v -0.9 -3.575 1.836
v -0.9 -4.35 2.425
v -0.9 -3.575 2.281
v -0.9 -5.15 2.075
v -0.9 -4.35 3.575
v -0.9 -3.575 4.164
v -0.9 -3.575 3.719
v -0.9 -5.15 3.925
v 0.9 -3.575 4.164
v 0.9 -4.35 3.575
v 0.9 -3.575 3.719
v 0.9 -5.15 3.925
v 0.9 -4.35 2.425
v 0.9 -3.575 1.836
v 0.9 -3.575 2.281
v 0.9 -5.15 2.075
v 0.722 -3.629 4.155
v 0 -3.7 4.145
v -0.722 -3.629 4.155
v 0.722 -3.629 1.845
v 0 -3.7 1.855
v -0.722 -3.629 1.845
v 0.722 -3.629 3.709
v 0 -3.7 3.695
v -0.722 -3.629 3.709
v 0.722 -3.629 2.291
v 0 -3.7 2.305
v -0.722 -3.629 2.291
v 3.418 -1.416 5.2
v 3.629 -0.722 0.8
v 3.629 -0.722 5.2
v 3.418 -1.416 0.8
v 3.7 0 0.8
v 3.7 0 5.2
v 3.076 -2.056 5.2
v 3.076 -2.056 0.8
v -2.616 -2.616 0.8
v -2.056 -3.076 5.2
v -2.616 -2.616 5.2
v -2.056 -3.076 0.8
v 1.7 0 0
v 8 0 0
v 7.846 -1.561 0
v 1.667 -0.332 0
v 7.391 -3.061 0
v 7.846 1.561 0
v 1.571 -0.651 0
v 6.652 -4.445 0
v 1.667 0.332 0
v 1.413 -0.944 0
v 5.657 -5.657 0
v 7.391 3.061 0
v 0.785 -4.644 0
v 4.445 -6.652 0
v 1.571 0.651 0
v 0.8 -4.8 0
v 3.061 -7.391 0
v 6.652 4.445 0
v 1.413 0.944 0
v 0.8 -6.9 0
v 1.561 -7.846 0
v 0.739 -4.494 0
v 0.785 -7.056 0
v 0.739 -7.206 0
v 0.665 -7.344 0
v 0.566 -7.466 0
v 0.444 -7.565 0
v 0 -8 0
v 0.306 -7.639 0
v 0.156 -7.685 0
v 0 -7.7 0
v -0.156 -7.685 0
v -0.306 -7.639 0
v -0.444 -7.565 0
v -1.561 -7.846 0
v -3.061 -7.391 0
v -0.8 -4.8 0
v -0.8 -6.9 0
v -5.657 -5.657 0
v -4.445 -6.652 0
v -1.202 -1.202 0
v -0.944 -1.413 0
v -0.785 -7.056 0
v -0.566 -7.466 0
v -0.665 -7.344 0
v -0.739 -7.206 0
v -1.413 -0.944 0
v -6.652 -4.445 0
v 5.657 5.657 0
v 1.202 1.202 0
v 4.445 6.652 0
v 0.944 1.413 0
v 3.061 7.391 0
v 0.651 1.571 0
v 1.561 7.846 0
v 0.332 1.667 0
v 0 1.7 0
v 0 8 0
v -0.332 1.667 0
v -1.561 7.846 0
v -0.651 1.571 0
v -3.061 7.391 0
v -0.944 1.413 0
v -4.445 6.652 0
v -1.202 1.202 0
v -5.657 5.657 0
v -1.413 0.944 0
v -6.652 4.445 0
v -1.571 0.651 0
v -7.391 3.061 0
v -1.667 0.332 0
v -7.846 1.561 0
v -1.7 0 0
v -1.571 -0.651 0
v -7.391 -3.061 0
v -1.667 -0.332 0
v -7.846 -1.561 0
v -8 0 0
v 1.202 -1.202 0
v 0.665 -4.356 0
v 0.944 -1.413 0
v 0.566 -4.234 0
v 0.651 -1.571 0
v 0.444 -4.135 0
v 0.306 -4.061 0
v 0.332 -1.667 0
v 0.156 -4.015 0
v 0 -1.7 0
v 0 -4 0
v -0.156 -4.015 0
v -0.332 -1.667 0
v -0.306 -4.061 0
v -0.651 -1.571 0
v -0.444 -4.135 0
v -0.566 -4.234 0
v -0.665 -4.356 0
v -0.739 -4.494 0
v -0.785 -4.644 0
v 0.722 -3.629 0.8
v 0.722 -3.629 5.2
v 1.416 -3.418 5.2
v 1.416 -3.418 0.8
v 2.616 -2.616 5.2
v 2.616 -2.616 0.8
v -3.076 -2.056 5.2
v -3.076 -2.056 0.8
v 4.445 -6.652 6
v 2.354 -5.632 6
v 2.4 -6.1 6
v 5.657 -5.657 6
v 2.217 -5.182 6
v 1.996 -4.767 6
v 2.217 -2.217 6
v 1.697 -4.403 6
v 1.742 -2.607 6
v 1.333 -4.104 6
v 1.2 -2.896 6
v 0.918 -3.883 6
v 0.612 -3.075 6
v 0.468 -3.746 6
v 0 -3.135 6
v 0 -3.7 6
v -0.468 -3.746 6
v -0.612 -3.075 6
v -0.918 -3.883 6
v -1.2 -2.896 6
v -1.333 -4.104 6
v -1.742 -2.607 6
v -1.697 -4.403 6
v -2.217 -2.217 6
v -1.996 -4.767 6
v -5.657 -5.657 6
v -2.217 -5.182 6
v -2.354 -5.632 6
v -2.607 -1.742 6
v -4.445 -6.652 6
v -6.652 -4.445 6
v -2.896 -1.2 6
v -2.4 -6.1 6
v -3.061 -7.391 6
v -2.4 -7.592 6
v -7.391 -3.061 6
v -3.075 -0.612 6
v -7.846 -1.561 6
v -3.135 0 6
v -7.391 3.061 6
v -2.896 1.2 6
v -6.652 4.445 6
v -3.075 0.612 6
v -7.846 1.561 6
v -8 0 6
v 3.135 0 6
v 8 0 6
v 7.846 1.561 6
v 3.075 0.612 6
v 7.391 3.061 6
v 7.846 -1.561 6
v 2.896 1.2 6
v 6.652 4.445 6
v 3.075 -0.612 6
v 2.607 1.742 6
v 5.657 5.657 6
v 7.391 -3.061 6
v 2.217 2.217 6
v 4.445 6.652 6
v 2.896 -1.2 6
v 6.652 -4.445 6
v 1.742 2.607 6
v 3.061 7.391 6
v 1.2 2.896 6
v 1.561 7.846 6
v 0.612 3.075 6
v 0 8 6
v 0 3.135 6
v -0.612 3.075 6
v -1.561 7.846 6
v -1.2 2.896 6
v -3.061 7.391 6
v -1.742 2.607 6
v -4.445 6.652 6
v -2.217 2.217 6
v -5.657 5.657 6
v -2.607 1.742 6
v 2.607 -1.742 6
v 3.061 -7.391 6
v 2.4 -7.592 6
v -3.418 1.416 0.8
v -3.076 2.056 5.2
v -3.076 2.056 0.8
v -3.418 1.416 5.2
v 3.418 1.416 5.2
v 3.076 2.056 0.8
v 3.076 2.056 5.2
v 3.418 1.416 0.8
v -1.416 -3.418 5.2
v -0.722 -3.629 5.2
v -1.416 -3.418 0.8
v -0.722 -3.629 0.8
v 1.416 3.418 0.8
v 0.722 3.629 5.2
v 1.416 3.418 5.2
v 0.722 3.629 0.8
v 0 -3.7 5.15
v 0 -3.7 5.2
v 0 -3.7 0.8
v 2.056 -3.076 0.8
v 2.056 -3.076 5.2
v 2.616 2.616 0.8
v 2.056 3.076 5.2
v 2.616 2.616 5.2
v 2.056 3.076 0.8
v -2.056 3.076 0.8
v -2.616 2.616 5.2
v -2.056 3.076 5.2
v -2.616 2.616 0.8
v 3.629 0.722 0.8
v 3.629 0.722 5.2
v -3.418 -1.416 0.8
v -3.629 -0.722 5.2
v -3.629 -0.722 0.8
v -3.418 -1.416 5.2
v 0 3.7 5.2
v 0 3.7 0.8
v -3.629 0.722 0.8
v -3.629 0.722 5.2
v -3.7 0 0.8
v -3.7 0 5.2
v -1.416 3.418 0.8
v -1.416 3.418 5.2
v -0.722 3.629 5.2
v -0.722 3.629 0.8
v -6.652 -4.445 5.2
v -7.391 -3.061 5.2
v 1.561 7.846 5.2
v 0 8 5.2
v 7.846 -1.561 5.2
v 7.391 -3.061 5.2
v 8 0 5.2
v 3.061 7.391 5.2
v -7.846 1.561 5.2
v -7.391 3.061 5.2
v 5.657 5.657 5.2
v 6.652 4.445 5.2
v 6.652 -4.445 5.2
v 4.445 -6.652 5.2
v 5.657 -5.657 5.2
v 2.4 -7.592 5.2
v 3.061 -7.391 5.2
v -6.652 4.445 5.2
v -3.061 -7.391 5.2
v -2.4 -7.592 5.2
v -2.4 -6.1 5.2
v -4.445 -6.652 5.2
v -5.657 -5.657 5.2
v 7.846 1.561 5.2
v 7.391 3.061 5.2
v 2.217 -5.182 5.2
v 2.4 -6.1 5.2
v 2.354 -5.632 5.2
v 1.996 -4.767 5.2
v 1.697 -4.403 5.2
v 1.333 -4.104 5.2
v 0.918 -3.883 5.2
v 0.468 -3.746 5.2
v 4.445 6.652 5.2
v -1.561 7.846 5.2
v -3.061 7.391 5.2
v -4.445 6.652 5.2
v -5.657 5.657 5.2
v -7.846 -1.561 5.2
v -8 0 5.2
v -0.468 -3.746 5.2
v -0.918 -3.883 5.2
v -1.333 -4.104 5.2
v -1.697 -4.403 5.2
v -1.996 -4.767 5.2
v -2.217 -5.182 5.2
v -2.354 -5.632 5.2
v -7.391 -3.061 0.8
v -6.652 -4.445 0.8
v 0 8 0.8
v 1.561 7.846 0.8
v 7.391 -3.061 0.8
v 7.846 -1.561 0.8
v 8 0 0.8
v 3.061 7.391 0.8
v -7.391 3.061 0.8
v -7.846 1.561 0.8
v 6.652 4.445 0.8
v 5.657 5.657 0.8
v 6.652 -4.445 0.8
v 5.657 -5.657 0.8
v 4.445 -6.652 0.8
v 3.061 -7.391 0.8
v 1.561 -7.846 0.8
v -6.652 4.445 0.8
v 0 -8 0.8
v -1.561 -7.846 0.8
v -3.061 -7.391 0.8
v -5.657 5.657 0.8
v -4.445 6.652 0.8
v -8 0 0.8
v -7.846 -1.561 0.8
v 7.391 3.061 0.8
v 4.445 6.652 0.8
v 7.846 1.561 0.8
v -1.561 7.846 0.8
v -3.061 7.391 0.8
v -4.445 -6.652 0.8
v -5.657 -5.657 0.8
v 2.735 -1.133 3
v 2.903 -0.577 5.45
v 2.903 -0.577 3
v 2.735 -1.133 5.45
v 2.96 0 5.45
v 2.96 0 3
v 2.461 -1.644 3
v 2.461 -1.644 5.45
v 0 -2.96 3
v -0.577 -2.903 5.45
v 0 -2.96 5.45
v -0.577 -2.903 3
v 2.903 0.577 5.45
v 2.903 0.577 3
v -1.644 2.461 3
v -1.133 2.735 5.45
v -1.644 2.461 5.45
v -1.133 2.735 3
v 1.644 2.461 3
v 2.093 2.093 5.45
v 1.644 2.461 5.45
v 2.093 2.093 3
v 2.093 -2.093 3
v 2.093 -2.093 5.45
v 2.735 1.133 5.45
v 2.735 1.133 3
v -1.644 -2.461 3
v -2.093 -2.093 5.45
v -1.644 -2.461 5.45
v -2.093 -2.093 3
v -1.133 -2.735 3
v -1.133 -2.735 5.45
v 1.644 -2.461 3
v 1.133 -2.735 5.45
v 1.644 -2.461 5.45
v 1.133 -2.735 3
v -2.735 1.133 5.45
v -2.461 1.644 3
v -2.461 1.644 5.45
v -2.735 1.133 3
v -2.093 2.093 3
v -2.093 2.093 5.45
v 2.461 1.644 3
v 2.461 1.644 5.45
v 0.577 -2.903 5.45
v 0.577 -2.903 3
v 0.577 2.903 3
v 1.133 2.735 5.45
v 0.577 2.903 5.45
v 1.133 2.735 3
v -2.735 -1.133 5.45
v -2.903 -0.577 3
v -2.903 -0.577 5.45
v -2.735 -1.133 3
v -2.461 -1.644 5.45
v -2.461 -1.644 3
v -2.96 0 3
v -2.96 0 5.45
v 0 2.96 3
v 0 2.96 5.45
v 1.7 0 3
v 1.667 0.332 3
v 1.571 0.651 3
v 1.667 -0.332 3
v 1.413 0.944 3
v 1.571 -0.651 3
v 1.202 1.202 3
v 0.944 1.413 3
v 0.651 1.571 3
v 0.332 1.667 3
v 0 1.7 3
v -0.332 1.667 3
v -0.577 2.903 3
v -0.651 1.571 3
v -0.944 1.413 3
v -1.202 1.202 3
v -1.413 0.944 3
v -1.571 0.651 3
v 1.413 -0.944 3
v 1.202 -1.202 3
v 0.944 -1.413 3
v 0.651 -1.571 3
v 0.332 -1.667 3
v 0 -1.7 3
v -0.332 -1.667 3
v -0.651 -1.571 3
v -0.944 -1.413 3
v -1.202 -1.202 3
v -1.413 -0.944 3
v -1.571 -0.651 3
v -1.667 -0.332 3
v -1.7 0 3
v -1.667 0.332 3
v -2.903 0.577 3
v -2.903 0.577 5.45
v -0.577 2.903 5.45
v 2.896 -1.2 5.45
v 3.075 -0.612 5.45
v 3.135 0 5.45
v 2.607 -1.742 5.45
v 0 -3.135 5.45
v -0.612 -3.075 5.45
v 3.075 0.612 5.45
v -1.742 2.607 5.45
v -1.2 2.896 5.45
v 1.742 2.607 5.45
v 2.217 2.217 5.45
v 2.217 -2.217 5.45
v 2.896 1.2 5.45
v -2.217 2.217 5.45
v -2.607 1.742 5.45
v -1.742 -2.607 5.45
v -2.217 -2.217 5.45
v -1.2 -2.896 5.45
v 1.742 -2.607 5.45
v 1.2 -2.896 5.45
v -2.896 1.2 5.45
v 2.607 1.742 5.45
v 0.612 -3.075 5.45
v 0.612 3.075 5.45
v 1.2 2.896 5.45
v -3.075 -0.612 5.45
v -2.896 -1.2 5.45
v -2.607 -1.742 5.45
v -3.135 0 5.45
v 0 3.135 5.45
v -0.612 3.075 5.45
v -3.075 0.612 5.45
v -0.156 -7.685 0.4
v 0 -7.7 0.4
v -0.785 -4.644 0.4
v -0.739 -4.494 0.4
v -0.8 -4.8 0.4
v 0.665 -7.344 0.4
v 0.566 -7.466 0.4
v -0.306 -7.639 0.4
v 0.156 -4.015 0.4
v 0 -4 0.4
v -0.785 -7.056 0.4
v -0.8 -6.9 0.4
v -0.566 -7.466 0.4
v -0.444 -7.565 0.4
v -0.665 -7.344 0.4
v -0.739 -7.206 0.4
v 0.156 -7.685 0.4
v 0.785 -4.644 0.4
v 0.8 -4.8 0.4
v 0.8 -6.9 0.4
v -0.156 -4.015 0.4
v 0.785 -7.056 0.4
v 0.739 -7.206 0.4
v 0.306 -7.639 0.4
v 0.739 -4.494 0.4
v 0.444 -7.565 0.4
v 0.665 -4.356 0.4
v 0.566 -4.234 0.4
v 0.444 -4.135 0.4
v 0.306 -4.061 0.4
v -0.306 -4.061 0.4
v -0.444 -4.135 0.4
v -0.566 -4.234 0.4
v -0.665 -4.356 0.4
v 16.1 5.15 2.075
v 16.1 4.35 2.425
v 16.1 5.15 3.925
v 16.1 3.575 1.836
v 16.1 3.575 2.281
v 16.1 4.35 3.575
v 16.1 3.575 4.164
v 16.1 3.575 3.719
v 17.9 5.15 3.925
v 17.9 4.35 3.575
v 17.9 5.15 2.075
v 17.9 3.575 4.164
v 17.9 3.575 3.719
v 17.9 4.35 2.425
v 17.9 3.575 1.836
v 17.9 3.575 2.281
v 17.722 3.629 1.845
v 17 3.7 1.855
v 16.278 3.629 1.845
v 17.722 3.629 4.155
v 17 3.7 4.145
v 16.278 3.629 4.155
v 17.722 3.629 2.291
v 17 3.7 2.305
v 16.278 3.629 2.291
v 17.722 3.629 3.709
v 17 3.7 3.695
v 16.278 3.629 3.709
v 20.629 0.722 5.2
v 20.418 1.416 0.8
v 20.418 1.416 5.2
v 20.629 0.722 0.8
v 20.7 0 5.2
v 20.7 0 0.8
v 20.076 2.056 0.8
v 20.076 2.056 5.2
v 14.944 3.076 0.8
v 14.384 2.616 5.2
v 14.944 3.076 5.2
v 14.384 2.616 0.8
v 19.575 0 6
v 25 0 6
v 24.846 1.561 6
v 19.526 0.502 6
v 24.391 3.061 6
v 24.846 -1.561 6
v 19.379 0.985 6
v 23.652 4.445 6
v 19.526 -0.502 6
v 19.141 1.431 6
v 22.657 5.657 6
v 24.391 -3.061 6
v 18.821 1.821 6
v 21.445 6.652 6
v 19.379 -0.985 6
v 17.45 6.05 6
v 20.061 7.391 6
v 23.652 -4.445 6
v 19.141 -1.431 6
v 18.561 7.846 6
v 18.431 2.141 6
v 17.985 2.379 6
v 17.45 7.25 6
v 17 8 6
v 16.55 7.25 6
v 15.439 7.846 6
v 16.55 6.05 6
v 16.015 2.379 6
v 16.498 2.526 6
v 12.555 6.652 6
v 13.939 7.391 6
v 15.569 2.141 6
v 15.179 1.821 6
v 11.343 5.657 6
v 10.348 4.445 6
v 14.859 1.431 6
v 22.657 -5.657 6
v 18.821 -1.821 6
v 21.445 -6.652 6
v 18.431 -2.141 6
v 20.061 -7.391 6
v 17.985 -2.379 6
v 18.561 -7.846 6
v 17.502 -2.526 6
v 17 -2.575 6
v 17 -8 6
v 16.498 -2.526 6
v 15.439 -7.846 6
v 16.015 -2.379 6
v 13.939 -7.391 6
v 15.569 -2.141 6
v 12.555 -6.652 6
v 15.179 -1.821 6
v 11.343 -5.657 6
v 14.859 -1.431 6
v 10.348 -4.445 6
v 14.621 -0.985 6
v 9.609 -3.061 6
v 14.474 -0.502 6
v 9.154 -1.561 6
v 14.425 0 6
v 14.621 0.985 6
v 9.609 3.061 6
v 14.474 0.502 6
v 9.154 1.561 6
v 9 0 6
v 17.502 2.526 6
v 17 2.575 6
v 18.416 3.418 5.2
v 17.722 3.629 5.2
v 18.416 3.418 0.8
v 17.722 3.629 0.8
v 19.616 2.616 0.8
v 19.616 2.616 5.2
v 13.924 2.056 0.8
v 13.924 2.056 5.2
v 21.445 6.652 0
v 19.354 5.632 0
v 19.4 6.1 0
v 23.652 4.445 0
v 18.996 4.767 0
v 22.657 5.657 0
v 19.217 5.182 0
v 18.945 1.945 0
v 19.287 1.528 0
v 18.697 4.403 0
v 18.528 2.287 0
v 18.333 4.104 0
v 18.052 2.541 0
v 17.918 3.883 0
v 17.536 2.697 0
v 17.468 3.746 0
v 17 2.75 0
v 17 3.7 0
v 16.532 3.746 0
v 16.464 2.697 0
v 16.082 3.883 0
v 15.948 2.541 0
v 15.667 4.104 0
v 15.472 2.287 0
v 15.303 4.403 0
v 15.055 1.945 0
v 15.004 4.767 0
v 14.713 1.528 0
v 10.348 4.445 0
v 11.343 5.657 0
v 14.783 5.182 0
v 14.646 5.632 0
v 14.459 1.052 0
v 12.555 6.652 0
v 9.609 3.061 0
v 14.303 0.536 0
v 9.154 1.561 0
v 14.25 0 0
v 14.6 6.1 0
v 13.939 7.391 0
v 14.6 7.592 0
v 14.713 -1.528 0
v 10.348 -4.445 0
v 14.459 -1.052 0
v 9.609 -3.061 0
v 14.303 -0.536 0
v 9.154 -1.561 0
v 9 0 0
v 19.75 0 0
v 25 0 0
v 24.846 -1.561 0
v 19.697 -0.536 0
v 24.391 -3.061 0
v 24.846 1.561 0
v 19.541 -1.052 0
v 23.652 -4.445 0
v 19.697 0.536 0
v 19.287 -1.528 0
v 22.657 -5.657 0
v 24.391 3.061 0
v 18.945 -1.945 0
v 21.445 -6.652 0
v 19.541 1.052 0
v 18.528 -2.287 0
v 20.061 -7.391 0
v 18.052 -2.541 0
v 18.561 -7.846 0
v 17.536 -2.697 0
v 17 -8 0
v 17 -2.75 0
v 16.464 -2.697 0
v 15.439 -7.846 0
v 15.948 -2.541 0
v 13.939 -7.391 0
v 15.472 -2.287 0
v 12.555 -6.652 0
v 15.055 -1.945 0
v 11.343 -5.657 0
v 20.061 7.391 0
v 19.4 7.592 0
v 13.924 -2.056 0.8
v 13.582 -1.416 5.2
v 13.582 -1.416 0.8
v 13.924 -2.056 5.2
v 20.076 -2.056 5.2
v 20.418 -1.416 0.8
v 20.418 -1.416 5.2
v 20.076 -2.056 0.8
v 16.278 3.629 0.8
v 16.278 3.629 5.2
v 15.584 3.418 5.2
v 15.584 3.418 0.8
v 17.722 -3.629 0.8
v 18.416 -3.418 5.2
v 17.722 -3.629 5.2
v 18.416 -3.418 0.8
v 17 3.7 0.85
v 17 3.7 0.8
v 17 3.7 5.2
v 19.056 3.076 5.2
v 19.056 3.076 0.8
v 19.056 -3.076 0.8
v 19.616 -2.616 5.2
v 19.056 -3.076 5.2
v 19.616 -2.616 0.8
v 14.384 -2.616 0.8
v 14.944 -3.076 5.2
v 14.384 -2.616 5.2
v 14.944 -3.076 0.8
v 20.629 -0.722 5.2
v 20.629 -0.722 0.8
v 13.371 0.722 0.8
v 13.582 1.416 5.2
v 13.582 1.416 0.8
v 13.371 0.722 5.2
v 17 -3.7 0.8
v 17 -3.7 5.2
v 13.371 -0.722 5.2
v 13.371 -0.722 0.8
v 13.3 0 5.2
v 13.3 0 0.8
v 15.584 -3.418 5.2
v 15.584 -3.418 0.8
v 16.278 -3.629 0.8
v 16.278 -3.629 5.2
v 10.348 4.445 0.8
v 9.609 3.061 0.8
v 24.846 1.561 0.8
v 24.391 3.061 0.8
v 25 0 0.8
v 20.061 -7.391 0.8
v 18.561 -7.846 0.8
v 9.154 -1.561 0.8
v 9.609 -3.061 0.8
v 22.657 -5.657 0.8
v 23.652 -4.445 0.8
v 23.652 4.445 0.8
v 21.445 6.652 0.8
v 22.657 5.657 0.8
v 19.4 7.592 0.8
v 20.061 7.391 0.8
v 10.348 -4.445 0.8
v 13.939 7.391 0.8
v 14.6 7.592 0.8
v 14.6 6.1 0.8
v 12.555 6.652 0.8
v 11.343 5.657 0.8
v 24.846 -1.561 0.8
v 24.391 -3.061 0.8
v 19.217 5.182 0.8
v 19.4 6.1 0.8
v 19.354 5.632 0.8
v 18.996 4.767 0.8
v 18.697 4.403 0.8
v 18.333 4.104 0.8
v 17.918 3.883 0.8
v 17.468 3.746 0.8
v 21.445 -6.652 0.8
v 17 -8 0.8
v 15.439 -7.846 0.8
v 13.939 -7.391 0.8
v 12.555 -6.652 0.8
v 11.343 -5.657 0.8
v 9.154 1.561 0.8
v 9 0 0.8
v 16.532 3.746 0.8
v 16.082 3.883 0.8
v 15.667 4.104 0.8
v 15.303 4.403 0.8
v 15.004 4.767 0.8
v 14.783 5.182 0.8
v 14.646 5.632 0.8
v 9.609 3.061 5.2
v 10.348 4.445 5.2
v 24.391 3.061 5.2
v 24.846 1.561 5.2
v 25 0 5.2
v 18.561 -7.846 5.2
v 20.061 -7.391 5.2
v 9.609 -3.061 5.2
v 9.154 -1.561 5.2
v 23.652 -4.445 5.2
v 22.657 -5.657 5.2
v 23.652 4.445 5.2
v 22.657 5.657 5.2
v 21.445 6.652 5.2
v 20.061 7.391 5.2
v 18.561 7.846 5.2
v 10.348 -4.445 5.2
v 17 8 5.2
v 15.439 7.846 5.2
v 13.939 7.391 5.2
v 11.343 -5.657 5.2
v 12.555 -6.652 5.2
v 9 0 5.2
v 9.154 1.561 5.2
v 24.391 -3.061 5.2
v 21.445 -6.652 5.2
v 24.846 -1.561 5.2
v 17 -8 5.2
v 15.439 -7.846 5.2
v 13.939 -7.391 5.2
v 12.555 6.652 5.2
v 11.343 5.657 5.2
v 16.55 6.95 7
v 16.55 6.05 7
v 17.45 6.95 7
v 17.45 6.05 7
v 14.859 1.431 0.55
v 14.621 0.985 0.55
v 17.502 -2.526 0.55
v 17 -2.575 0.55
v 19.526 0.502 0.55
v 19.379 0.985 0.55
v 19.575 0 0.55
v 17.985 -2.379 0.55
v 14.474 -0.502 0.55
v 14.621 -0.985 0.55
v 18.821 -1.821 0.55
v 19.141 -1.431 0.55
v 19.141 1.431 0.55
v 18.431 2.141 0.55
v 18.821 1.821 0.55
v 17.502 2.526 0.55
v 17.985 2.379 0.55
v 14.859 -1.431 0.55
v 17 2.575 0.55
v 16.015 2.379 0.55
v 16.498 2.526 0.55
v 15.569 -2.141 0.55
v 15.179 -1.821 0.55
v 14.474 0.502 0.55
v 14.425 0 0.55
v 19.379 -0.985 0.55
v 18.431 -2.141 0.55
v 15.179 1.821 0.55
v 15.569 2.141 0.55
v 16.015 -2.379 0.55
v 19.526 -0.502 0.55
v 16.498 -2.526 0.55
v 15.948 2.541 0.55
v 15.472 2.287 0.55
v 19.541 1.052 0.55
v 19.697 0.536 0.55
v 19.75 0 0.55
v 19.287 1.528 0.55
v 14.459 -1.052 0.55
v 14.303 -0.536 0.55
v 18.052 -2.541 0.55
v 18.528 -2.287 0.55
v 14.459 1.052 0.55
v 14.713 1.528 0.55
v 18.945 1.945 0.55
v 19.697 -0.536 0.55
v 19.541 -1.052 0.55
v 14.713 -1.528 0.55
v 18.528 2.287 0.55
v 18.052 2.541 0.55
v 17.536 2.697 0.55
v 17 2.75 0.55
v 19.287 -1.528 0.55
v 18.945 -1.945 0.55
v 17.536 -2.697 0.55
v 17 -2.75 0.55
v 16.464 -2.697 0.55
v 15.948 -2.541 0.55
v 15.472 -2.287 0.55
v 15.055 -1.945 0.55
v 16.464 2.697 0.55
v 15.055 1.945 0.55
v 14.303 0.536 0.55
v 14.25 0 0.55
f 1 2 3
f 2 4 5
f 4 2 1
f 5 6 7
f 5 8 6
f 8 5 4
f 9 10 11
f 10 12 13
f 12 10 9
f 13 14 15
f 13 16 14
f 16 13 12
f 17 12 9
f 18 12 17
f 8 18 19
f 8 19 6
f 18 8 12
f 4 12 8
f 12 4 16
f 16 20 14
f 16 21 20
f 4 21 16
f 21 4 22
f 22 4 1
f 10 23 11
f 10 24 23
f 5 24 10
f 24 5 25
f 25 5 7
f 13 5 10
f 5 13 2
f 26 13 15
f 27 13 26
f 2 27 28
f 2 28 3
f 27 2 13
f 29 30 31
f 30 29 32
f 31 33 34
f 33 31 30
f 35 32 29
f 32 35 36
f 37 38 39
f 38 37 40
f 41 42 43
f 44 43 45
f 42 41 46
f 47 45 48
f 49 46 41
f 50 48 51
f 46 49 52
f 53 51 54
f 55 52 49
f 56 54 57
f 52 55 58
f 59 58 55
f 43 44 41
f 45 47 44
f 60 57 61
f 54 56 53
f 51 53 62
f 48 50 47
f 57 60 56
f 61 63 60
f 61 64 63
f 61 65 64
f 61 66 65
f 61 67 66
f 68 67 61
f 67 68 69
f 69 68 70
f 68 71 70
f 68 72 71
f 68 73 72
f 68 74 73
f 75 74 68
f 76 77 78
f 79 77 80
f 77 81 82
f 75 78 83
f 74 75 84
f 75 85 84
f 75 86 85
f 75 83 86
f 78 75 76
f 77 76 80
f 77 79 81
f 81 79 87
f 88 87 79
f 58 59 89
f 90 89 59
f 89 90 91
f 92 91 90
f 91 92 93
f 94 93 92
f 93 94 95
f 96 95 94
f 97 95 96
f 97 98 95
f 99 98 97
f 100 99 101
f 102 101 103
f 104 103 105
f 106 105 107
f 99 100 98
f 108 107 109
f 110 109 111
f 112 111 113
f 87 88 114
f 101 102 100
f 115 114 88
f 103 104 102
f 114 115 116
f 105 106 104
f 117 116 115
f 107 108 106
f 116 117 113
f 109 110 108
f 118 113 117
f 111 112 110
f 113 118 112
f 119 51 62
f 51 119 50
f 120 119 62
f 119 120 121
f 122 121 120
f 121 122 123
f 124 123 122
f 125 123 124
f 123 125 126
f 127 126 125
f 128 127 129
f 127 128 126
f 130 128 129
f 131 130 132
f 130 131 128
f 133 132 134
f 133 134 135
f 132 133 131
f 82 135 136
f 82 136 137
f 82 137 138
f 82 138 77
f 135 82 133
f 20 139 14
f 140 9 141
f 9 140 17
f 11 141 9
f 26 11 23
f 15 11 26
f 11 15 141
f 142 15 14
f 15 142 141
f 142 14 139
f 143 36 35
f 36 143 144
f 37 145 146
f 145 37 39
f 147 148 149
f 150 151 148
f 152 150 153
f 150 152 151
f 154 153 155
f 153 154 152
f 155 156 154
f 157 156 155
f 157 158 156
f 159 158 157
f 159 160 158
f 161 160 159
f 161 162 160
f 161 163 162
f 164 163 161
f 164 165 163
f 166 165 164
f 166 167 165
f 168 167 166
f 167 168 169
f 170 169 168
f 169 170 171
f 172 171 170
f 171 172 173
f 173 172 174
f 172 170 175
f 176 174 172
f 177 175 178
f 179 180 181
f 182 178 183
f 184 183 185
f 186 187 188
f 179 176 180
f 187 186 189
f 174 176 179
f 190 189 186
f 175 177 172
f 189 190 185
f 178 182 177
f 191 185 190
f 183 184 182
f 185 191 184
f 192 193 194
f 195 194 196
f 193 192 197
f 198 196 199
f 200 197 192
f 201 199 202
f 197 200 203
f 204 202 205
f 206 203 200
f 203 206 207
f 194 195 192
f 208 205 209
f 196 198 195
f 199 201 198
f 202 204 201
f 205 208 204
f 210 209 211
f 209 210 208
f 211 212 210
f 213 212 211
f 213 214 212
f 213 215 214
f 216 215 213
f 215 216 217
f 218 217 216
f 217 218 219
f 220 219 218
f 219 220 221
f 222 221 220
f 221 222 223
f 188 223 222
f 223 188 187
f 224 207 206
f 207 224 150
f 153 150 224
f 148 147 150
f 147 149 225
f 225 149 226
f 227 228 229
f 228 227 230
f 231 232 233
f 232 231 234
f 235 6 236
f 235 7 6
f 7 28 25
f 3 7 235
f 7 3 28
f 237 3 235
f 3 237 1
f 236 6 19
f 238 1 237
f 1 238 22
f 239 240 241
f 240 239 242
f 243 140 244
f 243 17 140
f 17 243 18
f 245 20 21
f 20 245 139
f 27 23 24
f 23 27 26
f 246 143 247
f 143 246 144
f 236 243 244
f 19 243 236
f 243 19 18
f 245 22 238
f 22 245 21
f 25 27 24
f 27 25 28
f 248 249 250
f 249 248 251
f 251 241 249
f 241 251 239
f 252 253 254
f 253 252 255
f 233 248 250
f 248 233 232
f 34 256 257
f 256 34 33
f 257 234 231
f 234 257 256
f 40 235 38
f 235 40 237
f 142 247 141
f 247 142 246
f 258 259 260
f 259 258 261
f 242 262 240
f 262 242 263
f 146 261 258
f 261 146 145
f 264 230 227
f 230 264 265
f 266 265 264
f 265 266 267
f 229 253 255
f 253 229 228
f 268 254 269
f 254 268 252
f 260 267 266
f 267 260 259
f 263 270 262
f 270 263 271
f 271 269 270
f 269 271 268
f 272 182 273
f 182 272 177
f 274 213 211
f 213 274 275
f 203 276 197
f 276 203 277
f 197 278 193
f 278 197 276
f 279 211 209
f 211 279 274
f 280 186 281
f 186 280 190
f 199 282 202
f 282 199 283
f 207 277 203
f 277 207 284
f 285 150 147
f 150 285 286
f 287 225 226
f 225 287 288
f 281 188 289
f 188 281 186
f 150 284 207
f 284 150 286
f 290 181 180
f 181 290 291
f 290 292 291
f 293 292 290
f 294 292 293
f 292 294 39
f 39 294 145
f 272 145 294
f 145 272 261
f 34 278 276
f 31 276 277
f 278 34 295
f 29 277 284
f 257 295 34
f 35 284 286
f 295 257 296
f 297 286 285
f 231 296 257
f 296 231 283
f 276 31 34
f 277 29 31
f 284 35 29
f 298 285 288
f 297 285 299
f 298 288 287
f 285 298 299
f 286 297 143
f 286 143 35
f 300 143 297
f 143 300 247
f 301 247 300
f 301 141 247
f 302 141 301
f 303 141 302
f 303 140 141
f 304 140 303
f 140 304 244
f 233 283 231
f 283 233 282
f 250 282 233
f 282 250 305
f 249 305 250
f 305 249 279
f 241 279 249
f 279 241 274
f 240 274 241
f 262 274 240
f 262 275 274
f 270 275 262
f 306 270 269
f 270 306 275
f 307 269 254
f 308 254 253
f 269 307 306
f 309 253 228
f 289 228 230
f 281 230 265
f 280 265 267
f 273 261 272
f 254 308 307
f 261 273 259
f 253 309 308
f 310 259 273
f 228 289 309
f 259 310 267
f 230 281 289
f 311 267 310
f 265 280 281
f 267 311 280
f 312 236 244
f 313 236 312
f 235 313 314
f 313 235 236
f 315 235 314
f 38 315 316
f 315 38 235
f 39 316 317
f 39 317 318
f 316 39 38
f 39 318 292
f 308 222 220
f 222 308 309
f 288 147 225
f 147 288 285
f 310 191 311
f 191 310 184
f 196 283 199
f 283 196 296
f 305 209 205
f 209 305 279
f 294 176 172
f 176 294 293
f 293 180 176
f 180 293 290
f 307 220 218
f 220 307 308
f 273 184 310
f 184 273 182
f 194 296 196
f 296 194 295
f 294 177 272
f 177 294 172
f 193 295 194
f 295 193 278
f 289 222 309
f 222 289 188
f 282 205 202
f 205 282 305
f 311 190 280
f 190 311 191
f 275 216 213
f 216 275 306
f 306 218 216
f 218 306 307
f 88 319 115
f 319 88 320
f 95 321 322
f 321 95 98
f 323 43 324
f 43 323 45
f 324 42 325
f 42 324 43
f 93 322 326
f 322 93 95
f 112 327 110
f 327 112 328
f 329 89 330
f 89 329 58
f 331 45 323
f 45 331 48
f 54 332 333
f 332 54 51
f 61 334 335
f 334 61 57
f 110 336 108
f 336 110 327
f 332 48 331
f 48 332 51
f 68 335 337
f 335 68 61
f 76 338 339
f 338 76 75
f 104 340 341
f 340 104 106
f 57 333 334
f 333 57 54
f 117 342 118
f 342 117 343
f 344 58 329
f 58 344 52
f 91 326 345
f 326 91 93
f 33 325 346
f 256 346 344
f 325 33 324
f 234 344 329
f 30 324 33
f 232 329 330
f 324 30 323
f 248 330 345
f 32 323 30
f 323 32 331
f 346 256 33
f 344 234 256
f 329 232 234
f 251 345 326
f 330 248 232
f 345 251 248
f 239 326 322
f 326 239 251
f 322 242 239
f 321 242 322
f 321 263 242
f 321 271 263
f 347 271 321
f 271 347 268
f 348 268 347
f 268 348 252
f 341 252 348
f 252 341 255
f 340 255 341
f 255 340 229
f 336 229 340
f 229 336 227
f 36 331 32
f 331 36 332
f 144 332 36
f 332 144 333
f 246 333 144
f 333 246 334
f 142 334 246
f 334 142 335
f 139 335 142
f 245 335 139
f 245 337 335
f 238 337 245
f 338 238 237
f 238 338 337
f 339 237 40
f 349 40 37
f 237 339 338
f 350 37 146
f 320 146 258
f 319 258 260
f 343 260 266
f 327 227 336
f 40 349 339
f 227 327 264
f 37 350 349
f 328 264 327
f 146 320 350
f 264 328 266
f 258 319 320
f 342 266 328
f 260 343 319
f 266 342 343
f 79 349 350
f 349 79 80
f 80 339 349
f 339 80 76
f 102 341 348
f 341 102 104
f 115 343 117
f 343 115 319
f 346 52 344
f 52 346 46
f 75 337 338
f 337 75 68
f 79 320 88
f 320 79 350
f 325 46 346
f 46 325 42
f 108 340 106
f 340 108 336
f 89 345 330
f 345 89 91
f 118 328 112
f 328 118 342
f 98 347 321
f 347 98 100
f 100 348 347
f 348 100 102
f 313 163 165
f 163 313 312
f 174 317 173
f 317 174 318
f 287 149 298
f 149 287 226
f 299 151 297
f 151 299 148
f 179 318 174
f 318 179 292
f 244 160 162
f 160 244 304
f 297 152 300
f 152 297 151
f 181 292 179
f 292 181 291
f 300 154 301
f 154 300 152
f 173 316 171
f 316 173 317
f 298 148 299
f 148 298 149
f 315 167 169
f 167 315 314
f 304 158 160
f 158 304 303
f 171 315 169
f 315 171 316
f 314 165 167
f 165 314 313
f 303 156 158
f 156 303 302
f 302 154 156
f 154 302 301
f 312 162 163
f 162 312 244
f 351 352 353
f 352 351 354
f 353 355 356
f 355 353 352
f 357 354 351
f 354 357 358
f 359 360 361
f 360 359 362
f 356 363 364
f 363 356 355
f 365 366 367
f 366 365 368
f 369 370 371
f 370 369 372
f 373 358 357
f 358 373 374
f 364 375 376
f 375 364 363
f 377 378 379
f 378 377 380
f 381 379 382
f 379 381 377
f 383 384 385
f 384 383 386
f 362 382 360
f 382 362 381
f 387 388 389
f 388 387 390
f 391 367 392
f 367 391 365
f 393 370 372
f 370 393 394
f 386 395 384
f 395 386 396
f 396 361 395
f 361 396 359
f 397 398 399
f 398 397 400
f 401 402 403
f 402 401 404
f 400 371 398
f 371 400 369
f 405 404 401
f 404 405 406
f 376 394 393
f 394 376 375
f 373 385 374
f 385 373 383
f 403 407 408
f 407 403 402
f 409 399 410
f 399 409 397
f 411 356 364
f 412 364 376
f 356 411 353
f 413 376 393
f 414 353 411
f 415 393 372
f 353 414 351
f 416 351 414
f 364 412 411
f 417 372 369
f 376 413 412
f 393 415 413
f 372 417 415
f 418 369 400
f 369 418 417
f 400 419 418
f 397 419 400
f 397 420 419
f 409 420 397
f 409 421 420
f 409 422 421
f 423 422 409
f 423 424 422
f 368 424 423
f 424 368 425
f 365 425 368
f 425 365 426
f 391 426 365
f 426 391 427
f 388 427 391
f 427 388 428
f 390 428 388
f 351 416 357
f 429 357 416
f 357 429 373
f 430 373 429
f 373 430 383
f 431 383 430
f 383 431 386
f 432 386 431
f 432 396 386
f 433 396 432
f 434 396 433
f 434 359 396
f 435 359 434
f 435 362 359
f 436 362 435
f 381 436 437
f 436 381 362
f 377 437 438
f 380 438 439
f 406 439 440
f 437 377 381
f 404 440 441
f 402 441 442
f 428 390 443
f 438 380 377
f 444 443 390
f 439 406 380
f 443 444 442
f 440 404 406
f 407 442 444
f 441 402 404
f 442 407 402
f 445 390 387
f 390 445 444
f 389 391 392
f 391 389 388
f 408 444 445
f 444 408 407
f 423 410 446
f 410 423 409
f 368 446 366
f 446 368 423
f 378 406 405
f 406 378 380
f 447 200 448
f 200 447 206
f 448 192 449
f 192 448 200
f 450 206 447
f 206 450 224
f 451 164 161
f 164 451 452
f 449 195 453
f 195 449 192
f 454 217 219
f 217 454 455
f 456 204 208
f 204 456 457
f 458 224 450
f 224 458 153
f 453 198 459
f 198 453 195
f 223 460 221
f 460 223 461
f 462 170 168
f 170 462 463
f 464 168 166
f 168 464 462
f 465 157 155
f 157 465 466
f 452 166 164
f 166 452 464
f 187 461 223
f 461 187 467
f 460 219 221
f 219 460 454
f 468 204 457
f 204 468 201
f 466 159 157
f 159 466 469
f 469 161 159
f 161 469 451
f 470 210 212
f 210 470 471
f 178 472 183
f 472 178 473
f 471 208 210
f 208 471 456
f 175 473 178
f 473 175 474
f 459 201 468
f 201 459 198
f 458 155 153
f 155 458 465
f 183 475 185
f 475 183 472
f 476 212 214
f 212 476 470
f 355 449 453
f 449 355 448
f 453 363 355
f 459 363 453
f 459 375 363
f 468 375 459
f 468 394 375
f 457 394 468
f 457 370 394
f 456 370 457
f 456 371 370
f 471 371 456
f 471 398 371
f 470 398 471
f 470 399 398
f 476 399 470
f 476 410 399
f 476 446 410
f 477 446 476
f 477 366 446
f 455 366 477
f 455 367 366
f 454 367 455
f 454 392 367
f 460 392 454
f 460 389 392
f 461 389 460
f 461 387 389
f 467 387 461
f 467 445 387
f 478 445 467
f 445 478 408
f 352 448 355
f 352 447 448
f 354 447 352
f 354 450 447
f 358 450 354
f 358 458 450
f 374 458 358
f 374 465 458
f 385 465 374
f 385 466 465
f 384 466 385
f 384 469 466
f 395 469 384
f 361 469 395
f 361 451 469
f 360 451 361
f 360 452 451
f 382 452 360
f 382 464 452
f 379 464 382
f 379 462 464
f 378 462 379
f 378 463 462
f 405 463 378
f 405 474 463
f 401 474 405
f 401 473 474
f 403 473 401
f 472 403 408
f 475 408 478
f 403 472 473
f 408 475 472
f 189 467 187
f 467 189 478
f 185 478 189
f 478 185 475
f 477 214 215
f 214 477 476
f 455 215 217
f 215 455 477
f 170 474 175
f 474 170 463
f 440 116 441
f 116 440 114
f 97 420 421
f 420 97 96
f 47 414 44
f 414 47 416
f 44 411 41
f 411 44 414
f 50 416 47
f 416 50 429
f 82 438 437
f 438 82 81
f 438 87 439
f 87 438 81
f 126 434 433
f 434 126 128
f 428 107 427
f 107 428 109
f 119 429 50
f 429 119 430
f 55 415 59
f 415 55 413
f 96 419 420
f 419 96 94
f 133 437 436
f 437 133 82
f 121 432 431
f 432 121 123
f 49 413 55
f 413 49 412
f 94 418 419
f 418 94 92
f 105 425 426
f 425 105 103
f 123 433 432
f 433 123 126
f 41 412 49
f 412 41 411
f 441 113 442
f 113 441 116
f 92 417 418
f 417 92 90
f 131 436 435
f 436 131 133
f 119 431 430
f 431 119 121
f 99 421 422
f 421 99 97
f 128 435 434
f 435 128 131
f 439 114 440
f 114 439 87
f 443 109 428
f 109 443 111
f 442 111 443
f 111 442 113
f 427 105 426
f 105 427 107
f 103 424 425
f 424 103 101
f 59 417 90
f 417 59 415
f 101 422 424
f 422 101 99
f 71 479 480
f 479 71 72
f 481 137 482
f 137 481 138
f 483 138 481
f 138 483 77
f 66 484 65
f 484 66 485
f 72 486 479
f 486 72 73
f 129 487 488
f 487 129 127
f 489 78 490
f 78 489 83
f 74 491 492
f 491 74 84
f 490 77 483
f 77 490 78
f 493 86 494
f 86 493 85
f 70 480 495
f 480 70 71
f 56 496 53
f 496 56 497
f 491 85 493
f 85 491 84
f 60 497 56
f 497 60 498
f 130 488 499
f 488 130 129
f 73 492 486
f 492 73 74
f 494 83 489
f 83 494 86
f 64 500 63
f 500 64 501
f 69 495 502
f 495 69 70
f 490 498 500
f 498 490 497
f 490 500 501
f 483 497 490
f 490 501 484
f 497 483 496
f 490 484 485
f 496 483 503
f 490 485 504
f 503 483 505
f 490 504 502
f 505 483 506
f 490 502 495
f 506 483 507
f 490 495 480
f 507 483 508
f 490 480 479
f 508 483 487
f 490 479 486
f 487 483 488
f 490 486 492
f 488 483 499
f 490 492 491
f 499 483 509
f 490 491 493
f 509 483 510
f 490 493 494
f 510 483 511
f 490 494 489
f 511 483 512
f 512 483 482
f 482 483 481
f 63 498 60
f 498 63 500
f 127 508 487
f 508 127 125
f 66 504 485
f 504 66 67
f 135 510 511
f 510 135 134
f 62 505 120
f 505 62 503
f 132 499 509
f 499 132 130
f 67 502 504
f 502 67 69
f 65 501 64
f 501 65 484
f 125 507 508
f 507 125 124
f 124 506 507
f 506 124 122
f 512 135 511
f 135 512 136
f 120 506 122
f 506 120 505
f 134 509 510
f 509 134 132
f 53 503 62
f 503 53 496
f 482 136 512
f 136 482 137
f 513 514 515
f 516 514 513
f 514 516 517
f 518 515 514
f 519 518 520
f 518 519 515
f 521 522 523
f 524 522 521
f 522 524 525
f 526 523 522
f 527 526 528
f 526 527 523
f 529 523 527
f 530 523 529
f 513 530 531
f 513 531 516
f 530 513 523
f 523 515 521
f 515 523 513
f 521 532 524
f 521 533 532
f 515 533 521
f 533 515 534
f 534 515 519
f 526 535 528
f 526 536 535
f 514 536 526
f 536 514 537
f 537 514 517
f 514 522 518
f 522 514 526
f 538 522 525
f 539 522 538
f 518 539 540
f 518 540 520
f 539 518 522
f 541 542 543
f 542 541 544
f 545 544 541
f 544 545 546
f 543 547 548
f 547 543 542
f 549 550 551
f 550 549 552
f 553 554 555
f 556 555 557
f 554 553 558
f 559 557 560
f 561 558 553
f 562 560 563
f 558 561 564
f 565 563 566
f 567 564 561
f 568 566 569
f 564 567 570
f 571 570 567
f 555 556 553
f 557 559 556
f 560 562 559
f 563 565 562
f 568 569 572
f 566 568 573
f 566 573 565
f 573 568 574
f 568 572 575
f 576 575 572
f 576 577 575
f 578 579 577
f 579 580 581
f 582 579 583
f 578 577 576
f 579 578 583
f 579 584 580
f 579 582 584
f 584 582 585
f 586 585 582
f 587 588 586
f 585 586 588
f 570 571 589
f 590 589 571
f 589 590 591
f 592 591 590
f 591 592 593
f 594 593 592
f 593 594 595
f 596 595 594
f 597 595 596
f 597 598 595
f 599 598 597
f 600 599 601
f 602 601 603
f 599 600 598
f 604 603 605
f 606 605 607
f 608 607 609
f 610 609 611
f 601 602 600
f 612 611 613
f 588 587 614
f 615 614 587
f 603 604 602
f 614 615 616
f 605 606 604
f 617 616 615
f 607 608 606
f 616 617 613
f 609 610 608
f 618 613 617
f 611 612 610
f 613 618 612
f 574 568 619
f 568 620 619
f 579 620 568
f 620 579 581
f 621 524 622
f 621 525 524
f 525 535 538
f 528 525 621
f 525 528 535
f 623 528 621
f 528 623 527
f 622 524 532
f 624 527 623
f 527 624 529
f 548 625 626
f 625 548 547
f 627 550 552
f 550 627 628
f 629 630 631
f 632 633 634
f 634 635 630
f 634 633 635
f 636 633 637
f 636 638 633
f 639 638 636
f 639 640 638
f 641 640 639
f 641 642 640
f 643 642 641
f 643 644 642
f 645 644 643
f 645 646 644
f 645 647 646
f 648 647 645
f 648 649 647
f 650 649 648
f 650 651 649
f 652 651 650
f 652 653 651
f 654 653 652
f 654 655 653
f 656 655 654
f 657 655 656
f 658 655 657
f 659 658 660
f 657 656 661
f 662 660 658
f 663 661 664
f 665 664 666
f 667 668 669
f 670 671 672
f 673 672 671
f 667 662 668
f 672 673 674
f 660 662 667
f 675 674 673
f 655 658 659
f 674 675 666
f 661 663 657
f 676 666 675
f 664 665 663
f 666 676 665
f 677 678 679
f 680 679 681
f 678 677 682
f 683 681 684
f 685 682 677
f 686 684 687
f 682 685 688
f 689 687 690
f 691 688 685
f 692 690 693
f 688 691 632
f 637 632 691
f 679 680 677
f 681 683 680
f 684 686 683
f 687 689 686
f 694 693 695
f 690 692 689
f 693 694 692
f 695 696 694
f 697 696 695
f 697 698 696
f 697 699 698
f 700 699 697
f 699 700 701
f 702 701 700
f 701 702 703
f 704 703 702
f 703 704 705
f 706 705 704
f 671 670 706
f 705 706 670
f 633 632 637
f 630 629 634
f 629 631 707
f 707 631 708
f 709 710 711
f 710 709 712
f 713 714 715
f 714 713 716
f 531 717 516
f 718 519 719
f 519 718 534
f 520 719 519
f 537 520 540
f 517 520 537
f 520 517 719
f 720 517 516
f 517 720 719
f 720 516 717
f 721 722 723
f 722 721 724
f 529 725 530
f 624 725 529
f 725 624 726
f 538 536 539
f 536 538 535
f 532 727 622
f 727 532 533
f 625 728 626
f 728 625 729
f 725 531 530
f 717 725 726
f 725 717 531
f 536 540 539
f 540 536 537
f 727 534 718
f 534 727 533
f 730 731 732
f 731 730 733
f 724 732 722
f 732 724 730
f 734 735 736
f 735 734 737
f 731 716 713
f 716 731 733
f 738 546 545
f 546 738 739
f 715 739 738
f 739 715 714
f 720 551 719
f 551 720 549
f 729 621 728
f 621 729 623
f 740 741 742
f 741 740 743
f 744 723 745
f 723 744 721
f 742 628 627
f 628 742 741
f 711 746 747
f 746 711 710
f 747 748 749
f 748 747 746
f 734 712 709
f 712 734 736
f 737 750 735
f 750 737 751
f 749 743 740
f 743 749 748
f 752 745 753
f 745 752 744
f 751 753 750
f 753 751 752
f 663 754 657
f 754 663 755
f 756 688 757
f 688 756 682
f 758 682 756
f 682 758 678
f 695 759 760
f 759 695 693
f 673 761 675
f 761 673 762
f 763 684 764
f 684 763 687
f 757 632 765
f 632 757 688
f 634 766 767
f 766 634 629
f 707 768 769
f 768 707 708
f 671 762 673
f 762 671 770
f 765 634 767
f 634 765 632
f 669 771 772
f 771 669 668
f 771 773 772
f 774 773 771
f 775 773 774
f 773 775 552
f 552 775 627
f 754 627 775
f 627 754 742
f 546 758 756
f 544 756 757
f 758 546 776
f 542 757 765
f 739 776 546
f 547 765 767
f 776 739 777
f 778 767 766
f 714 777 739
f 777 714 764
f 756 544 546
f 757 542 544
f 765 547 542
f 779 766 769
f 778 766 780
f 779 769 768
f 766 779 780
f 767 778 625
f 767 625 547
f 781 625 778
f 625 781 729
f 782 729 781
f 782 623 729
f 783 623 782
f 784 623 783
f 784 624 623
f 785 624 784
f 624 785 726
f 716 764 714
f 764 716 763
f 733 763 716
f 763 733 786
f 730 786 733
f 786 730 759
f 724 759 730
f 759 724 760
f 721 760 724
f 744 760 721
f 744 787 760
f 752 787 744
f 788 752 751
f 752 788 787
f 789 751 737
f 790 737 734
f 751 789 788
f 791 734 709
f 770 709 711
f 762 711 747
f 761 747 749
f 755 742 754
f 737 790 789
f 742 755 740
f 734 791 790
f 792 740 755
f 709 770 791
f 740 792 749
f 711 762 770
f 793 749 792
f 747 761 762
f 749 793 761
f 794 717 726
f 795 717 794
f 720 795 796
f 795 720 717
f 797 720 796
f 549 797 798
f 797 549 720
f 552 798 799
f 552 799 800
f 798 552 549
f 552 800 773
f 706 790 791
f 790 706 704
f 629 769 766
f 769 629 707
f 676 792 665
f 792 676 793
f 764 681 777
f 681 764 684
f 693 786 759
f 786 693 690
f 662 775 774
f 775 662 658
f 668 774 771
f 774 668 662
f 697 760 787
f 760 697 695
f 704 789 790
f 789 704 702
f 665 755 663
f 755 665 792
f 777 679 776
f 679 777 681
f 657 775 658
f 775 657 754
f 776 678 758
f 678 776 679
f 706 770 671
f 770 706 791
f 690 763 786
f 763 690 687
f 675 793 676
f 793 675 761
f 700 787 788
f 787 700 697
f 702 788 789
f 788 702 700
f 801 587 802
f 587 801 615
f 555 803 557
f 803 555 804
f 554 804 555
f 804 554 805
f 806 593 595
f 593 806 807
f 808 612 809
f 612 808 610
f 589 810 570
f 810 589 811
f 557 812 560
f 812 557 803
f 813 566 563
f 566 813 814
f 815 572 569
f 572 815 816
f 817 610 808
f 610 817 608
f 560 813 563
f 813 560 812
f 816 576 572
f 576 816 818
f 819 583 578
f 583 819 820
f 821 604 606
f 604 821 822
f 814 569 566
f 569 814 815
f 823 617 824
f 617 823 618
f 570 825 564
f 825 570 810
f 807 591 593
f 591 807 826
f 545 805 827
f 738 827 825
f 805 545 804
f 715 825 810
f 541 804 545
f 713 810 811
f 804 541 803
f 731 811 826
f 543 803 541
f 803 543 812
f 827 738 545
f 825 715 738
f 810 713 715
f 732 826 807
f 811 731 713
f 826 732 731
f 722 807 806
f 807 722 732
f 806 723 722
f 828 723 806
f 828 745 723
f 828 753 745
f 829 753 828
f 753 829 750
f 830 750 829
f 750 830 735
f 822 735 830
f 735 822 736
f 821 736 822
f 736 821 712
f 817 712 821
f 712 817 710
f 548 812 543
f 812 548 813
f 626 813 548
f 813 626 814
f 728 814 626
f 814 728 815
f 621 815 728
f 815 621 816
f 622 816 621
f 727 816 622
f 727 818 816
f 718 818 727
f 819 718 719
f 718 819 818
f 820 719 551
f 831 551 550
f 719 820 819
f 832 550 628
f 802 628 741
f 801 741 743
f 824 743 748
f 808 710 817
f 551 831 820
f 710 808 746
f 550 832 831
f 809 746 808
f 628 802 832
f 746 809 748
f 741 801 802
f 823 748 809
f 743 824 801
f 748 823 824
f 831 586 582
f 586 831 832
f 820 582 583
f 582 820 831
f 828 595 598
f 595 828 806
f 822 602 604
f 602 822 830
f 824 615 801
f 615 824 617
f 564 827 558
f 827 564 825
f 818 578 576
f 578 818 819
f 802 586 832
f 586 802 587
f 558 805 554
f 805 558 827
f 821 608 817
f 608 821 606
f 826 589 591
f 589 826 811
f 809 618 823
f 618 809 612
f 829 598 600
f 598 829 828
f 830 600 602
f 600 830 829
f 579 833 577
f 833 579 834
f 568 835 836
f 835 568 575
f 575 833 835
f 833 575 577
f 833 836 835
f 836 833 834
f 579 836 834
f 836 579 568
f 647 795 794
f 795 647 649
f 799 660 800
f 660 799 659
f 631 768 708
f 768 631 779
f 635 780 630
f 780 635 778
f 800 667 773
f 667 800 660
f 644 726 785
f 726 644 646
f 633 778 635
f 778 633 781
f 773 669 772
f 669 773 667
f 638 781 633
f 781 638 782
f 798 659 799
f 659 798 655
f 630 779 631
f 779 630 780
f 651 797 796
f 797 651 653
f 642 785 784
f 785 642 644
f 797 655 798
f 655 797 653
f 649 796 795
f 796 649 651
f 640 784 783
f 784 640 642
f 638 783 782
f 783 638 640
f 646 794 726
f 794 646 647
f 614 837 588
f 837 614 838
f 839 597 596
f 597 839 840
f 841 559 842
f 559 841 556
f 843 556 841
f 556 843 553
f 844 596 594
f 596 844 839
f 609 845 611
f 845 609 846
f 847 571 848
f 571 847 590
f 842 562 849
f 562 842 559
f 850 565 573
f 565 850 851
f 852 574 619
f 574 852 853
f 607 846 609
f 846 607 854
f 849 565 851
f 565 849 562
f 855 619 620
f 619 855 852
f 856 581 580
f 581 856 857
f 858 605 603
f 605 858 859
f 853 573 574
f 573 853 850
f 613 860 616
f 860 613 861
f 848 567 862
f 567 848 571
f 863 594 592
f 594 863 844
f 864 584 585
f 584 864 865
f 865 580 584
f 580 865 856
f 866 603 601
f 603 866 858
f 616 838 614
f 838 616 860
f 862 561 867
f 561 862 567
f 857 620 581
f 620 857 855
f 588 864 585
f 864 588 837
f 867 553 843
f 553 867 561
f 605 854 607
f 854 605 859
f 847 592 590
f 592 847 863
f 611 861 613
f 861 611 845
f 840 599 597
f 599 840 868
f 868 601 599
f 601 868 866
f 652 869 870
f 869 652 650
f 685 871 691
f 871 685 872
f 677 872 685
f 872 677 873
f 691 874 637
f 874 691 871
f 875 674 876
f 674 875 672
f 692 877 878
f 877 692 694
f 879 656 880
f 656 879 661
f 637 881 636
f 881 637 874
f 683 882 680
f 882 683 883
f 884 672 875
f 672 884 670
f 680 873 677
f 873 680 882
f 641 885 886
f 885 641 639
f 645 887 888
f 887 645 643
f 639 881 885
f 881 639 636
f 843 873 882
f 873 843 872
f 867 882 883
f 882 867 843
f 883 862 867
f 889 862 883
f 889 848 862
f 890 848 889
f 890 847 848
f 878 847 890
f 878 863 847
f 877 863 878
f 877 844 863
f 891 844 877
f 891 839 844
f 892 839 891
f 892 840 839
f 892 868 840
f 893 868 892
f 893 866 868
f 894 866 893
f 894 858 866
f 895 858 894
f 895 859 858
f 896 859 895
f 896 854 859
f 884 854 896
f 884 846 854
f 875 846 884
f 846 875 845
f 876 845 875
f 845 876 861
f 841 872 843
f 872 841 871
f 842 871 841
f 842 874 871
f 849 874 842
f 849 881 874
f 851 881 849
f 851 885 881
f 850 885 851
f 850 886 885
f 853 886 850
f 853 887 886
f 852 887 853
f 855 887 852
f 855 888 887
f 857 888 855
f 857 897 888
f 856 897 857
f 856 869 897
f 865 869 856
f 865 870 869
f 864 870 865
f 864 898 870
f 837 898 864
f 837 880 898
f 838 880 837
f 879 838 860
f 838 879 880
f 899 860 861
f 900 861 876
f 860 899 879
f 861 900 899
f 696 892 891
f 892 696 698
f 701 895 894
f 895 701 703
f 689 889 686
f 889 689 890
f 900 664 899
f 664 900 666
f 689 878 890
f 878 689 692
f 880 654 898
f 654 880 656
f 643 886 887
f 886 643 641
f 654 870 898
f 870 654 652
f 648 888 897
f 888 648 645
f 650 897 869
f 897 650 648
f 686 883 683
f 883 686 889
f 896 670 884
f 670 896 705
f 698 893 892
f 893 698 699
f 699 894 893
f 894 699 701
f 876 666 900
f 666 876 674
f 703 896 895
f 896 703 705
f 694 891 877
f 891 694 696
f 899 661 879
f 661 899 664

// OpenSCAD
// DOUBLE TAKE FRAMES DESIGN RELEASE
// DTF_RELEASE: 2.0.2
// Released: 2026-09-04
// Versioning: Semantic Versioning 2.0.0 (https://semver.org/)
// Status: CANONICAL
// Changes in 2.0.2:
// - Carried forward unchanged for the native 3MF packaging hotfix.
// Changes in 2.0.1:
// - Carried forward unchanged for the prepared-project packaging correction.
// Changes in 2.0.0:
// - Uses captive 16 mm flanges coordinated with the revised clock-string guide.
// - Adds keyed bottom-flange loading slots and revised string anchors.
// Full release notes: https://doubletakeframes.com/build/#design-release
//
// Canonical captive-flange capstans.
//
// The capstans use 16 mm flanges. The hour horn is moved outward to suit that
// flange, and the upside-down minute capstan uses a recessed orientation mark.
// Canonical bores, drum geometry, heights, and the eyelet's 9 mm datum remain.

$fn = 32;
eps = 0.05;

// Selected fits retained from canonical. These modeled bores deliberately
// differ from the supplied movement-member ODs: 3.17 mm inner and 5.05 mm
// middle. They are fit dimensions, not transcriptions of movement specs.
minute_bore_d = is_undef(shared_minute_capstan_bore_d)
    ? 3.40 : shared_minute_capstan_bore_d;
hour_bores = [5.15];
minute_lower_clearance_d = 5.92;
minute_lower_clearance_h = 3.0; // Preserve canonical transition datum.

// Main geometry. The added height moves only the upper flange; established
// lower seating, anchor, and minute-bore-transition datums remain unchanged.
canonical_total_h = 5.0;
total_h = is_undef(shared_capstan_total_h)
    ? 6.0 : shared_capstan_total_h;
flange_h = 0.80;
drum_d = 7.4; // Printed winding-drum OD; unrelated to movement sleeve specs.
flange_d = is_undef(shared_capstan_flange_d)
    ? 16.0 : shared_capstan_flange_d; // MOCKUP: canonical is 9.0
eyelet_reference_flange_d = 9.0; // Keep canonical eyelet outer position.
bore_mouth_extra = 0.35;
bore_mouth_h = 0.55;
part_spacing_x = flange_d+1;     // Preserve 1 mm between enlarged parts.

// Bottom-flange installation key. It shares the fixed beak/string-anchor
// radial datum (+Y) and cannot accept the beak when the capstan is upside down.
bottom_insertion_notch_enabled = is_undef(shared_bottom_insertion_notch_enabled)
    ? true : shared_bottom_insertion_notch_enabled;
bottom_insertion_notch_clearance_per_side =
    is_undef(shared_beak_notch_clearance_per_side)
        ? 0.40 : shared_beak_notch_clearance_per_side;
bottom_insertion_notch_w_x =
    (is_undef(shared_beak_tangential_w) ? 4.0 : shared_beak_tangential_w)
    + 2*bottom_insertion_notch_clearance_per_side;

// ---------- sacrificial print supports ----------

breakaway_supports_enabled = false;
breakaway_support_count = 6;
breakaway_post_radius = 7.3;
breakaway_body_d = 1.2;
breakaway_neck_d = 0.65;
breakaway_neck_h = 0.30;

// Existing external string anchor retained unchanged.
string_eyelet_enabled = true;
string_eyelet_flange_gap_z = 0.60;
string_eyelet_w_x = 1.8;
string_eyelet_drum_overlap_y = 0.20;
string_eyelet_beyond_flange_y = is_undef(shared_string_eyelet_beyond_flange_y)
    ? 0.65 : shared_string_eyelet_beyond_flange_y;
string_eyelet_inner_face_h_z = 2.35;
string_eyelet_outer_face_h_z = 1.85;
string_eyelet_wall_z = 0.35;
string_eyelet_outer_wall_y = 0.8;    // Retain canonical hook-tip strength.
string_eyelet_void_inset_y = 0.70;

// Hour indicator horn: canonical size shifted radially toward the 16 mm rim.
indicator_horn_enabled = true;
indicator_horn_inner_y = 6.05;
indicator_horn_outer_y = 7.25;
indicator_horn_w_x = 0.90;
indicator_horn_h_z = 1.00;
indicator_horn_taper_y = 0.30;

// Bed-facing rounded orientation mark for the upside-down minute capstan.
// It stays inside the retaining rim and does not cut through the 0.8 mm flange.
minute_mark_w_x = 1.6;
minute_mark_y0 = 4.8;
minute_mark_y1 = 6.9;
minute_mark_depth_z = 0.40;

module cyl(d, h, z=0) {
    translate([0, 0, z]) cylinder(d=d, h=h);
}

module prism_x(points_yz, w_x) {
    n = len(points_yz);
    polyhedron(
        points = concat(
            [for (p = points_yz) [-w_x/2, p[0], p[1]]],
            [for (p = points_yz) [ w_x/2, p[0], p[1]]]
        ),
        faces = concat(
            [[for (i = [n-1:-1:0]) i]],
            [[for (i = [0:n-1]) i+n]],
            [for (i = [0:n-1]) [i, (i+1)%n, ((i+1)%n)+n, i+n]]
        )
    );
}

module top_indicator_horn(enabled=indicator_horn_enabled) {
    if (enabled)
        prism_x(
            [
                [indicator_horn_inner_y, total_h],
                [indicator_horn_outer_y, total_h],
                [indicator_horn_outer_y-indicator_horn_taper_y, total_h+indicator_horn_h_z],
                [indicator_horn_inner_y, total_h+indicator_horn_h_z]
            ],
            indicator_horn_w_x
        );
}

function eyelet_channel_z0() = flange_h + string_eyelet_flange_gap_z;
function eyelet_channel_z1() = total_h - flange_h - string_eyelet_flange_gap_z;
function eyelet_mid_z() = total_h/2; // Recenter with beak in widened gap.
function eyelet_inner_y() = drum_d/2 - string_eyelet_drum_overlap_y;
function eyelet_outer_y() = eyelet_reference_flange_d/2 + string_eyelet_beyond_flange_y;
function eyelet_inner_z0() = eyelet_mid_z() - string_eyelet_inner_face_h_z/2;
function eyelet_inner_z1() = eyelet_mid_z() + string_eyelet_inner_face_h_z/2;
function eyelet_outer_z0() = eyelet_mid_z() - string_eyelet_outer_face_h_z/2;
function eyelet_outer_z1() = eyelet_mid_z() + string_eyelet_outer_face_h_z/2;
function eyelet_void_inner_y() = drum_d/2 - string_eyelet_void_inset_y;
function eyelet_void_outer_y() = eyelet_outer_y() - string_eyelet_outer_wall_y;
function eyelet_void_inner_z0() = eyelet_inner_z0() + string_eyelet_wall_z;
function eyelet_void_inner_z1() = eyelet_inner_z1() - string_eyelet_wall_z;
function eyelet_void_outer_z0() = eyelet_outer_z0() + string_eyelet_wall_z;
function eyelet_void_outer_z1() = eyelet_outer_z1() - string_eyelet_wall_z;

module flipped_trapezoid_eyelet_solid_body() {
    intersection() {
        prism_x(
            [
                [eyelet_inner_y(), eyelet_inner_z0()],
                [eyelet_outer_y(), eyelet_outer_z0()],
                [eyelet_outer_y(), eyelet_outer_z1()],
                [eyelet_inner_y(), eyelet_inner_z1()]
            ],
            string_eyelet_w_x
        );
        translate([0, 0, total_h/2])
            cube([flange_d+2, flange_d+2, eyelet_channel_z1()-eyelet_channel_z0()], center=true);
    }
}

module flipped_trapezoid_eyelet_inner_polygon_void() {
    prism_x(
        [
            [eyelet_void_inner_y(), eyelet_void_inner_z0()],
            [eyelet_void_outer_y(), eyelet_void_outer_z0()],
            [eyelet_void_outer_y(), eyelet_void_outer_z1()],
            [eyelet_void_inner_y(), eyelet_void_inner_z1()]
        ],
        string_eyelet_w_x + 2*eps
    );
}

module polygon_cut_flipped_trapezoid_eyelet() {
    difference() {
        flipped_trapezoid_eyelet_solid_body();
        flipped_trapezoid_eyelet_inner_polygon_void();
    }
}

module bottom_insertion_notch() {
    if (bottom_insertion_notch_enabled)
        translate([0, 0, -eps])
            linear_extrude(height=flange_h+2*eps)
                hull() {
                    // Rounded inner end is tangent to the drum: no drum cut.
                    translate([0, drum_d/2+bottom_insertion_notch_w_x/2])
                        circle(d=bottom_insertion_notch_w_x);
                    // Carry the slot completely through the outer flange rim.
                    translate([0, flange_d/2+bottom_insertion_notch_w_x/2])
                        circle(d=bottom_insertion_notch_w_x);
                }
}

module capstan_shell(with_indicator_horn=true) {
    difference() {
        union() {
            cyl(drum_d, total_h);
            cyl(flange_d, flange_h);
            cyl(flange_d, flange_h, total_h-flange_h);
            if (string_eyelet_enabled) polygon_cut_flipped_trapezoid_eyelet();
            top_indicator_horn(with_indicator_horn && indicator_horn_enabled);
        }
        bottom_insertion_notch();
    }
}

module minute_orientation_mark() {
    translate([0, 0, total_h-minute_mark_depth_z])
        linear_extrude(height=minute_mark_depth_z+eps)
            hull()
                for (mark_y = [minute_mark_y0, minute_mark_y1])
                    translate([0, mark_y])
                        circle(d=minute_mark_w_x);
}

module minute_capstan() {
    difference() {
        // Printed upside down; omit the horn so the lower cavity prints cleanly.
        capstan_shell(with_indicator_horn=false);
        translate([0, 0, -eps])
            cylinder(d=minute_lower_clearance_d,
                     h=minute_lower_clearance_h+eps);
        translate([0, 0, -eps])
            cylinder(d=minute_lower_clearance_d+bore_mouth_extra, h=bore_mouth_h+eps);
        translate([0, 0, minute_lower_clearance_h])
            cylinder(d=minute_bore_d,
                     h=total_h-minute_lower_clearance_h+eps);
        minute_orientation_mark();
    }
}

module hour_capstan(bore_d=5.15) {
    difference() {
        capstan_shell(with_indicator_horn=true);
        translate([0, 0, -eps])
            cylinder(d=bore_d, h=total_h+2*eps);
        translate([0, 0, -eps])
            cylinder(d=bore_d+bore_mouth_extra, h=bore_mouth_h+eps);
    }
}

module breakaway_post(angle) {
    post_xy = [
        breakaway_post_radius*cos(angle),
        breakaway_post_radius*sin(angle)
    ];
    lower_flange_z1 = flange_h;
    upper_flange_z0 = total_h-flange_h;
    body_z0 = lower_flange_z1+breakaway_neck_h;
    body_z1 = upper_flange_z0-breakaway_neck_h;

    // Bottom snip neck, short rigid body, and top snip neck. The body remains
    // at the accessible outer edge and never approaches the eyelet sweep.
    translate([post_xy[0], post_xy[1], lower_flange_z1-eps])
        cylinder(d=breakaway_neck_d, h=breakaway_neck_h+eps);
    translate([post_xy[0], post_xy[1], body_z0-eps])
        cylinder(d=breakaway_body_d, h=body_z1-body_z0+2*eps);
    translate([post_xy[0], post_xy[1], body_z1])
        cylinder(d=breakaway_neck_d, h=breakaway_neck_h+eps);
}

module breakaway_post_set() {
    if (breakaway_supports_enabled)
        for (i=[0:breakaway_support_count-1])
            breakaway_post(i*360/breakaway_support_count);
}

module minute_capstan_print_layout() {
    // Former horn face on the bed; the recessed marker becomes a bed imprint.
    translate([0, 0, total_h])
        rotate([180, 0, 0])
            minute_capstan();
    breakaway_post_set();
}

module hour_capstan_print_layout(bore_d=5.15) {
    hour_capstan(bore_d);
    breakaway_post_set();
}

// Render minute + hour, matching the canonical file's deliverable pattern.
minute_capstan_print_layout();
for (i=[0:len(hour_bores)-1])
    translate([(i+1)*part_spacing_x, 0, 0])
        hour_capstan_print_layout(hour_bores[i]);
